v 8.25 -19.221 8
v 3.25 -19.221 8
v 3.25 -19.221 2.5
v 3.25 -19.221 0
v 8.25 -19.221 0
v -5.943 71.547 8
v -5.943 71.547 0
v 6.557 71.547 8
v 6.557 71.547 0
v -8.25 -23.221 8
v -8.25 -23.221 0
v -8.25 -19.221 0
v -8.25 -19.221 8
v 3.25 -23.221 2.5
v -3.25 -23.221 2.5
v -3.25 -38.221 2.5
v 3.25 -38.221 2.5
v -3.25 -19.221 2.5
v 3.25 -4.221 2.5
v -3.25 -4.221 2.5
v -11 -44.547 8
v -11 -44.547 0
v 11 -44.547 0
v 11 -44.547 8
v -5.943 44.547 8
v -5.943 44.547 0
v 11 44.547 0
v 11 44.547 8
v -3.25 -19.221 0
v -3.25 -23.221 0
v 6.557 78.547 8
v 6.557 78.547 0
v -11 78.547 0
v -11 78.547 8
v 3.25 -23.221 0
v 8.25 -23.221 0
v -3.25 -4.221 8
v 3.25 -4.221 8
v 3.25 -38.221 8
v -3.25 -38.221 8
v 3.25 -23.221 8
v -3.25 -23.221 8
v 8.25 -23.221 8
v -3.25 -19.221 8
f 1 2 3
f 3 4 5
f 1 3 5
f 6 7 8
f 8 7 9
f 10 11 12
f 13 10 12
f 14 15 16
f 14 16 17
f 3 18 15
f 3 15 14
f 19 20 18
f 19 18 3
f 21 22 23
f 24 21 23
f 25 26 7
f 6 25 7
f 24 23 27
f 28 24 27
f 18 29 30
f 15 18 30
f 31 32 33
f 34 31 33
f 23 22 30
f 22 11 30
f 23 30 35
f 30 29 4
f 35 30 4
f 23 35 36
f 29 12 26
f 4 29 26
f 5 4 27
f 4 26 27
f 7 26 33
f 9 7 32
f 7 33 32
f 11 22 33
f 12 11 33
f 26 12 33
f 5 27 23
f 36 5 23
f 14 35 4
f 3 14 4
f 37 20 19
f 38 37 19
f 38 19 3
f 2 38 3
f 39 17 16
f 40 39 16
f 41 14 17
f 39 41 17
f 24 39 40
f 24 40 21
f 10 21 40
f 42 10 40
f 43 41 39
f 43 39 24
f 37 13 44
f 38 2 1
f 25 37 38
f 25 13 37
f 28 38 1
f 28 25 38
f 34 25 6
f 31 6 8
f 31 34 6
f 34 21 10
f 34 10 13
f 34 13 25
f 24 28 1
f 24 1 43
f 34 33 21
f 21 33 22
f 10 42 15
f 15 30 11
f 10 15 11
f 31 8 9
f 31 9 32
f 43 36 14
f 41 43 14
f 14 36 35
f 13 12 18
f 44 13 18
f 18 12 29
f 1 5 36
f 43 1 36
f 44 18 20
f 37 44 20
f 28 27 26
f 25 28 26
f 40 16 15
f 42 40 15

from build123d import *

# Parameters (mm, degrees)
F0_W     = 12.5
F0_H     = 7
F1_DEPTH = 8
F0_W_2   = 6.5
F0_H_2   = 15
F0_H_3   = 4
F2_DEPTH = 2.5


# Not quite as in the source:
# - a feature names something its author has since deleted; it is built from what else it names


with BuildPart() as f1:
    # F0 (on Top) → F1 (new body)
    with BuildSketch(Plane.XY):
        Polygon((-6.0006843501, 44.5469320043), (-5.9425927878, 44.5469320043), (-5.9425927878, 71.5469320043), (-5.9425927878, 78.5469320043), (-11, 78.5469320043), (-11, 44.5469320043), align=None)
        Polygon((11, -44.5469320043), (11, 44.5469320043), (1.4993156499, 44.5469320043), (-5.9425927878, 44.5469320043), (-6.0006843501, 44.5469320043), (-11, 44.5469320043), (-11, -44.5469320043), align=None)
        Polygon((-3.25, -4.2208939195), (3.25, -4.2208939195), (3.25, -19.2208939195), (8.25, -19.2208939195), (8.25, -23.2208939195), (3.25, -23.2208939195), (3.25, -38.2208939195), (-3.25, -38.2208939195), (-3.25, -23.2208939195), (-8.25, -23.2208939195), (-8.25, -19.2208939195), (-3.25, -19.2208939195), align=None, mode=Mode.SUBTRACT)
        with Locations((0.3074072122, 75.0469320043)):
            Rectangle(F0_W, F0_H)
    extrude(amount=F1_DEPTH)

    # F0 (on Top) → F2 (join)
    with BuildSketch(Plane.XY):
        with Locations((0, -11.7208939195)):
            Rectangle(F0_W_2, F0_H_2)
        with Locations((0, -21.2208939195)):
            Rectangle(F0_W_2, F0_H_3)
        with Locations((0, -30.7208939195)):
            Rectangle(F0_W_2, F0_H_2)
    extrude(amount=F2_DEPTH)


solid = f1.part
